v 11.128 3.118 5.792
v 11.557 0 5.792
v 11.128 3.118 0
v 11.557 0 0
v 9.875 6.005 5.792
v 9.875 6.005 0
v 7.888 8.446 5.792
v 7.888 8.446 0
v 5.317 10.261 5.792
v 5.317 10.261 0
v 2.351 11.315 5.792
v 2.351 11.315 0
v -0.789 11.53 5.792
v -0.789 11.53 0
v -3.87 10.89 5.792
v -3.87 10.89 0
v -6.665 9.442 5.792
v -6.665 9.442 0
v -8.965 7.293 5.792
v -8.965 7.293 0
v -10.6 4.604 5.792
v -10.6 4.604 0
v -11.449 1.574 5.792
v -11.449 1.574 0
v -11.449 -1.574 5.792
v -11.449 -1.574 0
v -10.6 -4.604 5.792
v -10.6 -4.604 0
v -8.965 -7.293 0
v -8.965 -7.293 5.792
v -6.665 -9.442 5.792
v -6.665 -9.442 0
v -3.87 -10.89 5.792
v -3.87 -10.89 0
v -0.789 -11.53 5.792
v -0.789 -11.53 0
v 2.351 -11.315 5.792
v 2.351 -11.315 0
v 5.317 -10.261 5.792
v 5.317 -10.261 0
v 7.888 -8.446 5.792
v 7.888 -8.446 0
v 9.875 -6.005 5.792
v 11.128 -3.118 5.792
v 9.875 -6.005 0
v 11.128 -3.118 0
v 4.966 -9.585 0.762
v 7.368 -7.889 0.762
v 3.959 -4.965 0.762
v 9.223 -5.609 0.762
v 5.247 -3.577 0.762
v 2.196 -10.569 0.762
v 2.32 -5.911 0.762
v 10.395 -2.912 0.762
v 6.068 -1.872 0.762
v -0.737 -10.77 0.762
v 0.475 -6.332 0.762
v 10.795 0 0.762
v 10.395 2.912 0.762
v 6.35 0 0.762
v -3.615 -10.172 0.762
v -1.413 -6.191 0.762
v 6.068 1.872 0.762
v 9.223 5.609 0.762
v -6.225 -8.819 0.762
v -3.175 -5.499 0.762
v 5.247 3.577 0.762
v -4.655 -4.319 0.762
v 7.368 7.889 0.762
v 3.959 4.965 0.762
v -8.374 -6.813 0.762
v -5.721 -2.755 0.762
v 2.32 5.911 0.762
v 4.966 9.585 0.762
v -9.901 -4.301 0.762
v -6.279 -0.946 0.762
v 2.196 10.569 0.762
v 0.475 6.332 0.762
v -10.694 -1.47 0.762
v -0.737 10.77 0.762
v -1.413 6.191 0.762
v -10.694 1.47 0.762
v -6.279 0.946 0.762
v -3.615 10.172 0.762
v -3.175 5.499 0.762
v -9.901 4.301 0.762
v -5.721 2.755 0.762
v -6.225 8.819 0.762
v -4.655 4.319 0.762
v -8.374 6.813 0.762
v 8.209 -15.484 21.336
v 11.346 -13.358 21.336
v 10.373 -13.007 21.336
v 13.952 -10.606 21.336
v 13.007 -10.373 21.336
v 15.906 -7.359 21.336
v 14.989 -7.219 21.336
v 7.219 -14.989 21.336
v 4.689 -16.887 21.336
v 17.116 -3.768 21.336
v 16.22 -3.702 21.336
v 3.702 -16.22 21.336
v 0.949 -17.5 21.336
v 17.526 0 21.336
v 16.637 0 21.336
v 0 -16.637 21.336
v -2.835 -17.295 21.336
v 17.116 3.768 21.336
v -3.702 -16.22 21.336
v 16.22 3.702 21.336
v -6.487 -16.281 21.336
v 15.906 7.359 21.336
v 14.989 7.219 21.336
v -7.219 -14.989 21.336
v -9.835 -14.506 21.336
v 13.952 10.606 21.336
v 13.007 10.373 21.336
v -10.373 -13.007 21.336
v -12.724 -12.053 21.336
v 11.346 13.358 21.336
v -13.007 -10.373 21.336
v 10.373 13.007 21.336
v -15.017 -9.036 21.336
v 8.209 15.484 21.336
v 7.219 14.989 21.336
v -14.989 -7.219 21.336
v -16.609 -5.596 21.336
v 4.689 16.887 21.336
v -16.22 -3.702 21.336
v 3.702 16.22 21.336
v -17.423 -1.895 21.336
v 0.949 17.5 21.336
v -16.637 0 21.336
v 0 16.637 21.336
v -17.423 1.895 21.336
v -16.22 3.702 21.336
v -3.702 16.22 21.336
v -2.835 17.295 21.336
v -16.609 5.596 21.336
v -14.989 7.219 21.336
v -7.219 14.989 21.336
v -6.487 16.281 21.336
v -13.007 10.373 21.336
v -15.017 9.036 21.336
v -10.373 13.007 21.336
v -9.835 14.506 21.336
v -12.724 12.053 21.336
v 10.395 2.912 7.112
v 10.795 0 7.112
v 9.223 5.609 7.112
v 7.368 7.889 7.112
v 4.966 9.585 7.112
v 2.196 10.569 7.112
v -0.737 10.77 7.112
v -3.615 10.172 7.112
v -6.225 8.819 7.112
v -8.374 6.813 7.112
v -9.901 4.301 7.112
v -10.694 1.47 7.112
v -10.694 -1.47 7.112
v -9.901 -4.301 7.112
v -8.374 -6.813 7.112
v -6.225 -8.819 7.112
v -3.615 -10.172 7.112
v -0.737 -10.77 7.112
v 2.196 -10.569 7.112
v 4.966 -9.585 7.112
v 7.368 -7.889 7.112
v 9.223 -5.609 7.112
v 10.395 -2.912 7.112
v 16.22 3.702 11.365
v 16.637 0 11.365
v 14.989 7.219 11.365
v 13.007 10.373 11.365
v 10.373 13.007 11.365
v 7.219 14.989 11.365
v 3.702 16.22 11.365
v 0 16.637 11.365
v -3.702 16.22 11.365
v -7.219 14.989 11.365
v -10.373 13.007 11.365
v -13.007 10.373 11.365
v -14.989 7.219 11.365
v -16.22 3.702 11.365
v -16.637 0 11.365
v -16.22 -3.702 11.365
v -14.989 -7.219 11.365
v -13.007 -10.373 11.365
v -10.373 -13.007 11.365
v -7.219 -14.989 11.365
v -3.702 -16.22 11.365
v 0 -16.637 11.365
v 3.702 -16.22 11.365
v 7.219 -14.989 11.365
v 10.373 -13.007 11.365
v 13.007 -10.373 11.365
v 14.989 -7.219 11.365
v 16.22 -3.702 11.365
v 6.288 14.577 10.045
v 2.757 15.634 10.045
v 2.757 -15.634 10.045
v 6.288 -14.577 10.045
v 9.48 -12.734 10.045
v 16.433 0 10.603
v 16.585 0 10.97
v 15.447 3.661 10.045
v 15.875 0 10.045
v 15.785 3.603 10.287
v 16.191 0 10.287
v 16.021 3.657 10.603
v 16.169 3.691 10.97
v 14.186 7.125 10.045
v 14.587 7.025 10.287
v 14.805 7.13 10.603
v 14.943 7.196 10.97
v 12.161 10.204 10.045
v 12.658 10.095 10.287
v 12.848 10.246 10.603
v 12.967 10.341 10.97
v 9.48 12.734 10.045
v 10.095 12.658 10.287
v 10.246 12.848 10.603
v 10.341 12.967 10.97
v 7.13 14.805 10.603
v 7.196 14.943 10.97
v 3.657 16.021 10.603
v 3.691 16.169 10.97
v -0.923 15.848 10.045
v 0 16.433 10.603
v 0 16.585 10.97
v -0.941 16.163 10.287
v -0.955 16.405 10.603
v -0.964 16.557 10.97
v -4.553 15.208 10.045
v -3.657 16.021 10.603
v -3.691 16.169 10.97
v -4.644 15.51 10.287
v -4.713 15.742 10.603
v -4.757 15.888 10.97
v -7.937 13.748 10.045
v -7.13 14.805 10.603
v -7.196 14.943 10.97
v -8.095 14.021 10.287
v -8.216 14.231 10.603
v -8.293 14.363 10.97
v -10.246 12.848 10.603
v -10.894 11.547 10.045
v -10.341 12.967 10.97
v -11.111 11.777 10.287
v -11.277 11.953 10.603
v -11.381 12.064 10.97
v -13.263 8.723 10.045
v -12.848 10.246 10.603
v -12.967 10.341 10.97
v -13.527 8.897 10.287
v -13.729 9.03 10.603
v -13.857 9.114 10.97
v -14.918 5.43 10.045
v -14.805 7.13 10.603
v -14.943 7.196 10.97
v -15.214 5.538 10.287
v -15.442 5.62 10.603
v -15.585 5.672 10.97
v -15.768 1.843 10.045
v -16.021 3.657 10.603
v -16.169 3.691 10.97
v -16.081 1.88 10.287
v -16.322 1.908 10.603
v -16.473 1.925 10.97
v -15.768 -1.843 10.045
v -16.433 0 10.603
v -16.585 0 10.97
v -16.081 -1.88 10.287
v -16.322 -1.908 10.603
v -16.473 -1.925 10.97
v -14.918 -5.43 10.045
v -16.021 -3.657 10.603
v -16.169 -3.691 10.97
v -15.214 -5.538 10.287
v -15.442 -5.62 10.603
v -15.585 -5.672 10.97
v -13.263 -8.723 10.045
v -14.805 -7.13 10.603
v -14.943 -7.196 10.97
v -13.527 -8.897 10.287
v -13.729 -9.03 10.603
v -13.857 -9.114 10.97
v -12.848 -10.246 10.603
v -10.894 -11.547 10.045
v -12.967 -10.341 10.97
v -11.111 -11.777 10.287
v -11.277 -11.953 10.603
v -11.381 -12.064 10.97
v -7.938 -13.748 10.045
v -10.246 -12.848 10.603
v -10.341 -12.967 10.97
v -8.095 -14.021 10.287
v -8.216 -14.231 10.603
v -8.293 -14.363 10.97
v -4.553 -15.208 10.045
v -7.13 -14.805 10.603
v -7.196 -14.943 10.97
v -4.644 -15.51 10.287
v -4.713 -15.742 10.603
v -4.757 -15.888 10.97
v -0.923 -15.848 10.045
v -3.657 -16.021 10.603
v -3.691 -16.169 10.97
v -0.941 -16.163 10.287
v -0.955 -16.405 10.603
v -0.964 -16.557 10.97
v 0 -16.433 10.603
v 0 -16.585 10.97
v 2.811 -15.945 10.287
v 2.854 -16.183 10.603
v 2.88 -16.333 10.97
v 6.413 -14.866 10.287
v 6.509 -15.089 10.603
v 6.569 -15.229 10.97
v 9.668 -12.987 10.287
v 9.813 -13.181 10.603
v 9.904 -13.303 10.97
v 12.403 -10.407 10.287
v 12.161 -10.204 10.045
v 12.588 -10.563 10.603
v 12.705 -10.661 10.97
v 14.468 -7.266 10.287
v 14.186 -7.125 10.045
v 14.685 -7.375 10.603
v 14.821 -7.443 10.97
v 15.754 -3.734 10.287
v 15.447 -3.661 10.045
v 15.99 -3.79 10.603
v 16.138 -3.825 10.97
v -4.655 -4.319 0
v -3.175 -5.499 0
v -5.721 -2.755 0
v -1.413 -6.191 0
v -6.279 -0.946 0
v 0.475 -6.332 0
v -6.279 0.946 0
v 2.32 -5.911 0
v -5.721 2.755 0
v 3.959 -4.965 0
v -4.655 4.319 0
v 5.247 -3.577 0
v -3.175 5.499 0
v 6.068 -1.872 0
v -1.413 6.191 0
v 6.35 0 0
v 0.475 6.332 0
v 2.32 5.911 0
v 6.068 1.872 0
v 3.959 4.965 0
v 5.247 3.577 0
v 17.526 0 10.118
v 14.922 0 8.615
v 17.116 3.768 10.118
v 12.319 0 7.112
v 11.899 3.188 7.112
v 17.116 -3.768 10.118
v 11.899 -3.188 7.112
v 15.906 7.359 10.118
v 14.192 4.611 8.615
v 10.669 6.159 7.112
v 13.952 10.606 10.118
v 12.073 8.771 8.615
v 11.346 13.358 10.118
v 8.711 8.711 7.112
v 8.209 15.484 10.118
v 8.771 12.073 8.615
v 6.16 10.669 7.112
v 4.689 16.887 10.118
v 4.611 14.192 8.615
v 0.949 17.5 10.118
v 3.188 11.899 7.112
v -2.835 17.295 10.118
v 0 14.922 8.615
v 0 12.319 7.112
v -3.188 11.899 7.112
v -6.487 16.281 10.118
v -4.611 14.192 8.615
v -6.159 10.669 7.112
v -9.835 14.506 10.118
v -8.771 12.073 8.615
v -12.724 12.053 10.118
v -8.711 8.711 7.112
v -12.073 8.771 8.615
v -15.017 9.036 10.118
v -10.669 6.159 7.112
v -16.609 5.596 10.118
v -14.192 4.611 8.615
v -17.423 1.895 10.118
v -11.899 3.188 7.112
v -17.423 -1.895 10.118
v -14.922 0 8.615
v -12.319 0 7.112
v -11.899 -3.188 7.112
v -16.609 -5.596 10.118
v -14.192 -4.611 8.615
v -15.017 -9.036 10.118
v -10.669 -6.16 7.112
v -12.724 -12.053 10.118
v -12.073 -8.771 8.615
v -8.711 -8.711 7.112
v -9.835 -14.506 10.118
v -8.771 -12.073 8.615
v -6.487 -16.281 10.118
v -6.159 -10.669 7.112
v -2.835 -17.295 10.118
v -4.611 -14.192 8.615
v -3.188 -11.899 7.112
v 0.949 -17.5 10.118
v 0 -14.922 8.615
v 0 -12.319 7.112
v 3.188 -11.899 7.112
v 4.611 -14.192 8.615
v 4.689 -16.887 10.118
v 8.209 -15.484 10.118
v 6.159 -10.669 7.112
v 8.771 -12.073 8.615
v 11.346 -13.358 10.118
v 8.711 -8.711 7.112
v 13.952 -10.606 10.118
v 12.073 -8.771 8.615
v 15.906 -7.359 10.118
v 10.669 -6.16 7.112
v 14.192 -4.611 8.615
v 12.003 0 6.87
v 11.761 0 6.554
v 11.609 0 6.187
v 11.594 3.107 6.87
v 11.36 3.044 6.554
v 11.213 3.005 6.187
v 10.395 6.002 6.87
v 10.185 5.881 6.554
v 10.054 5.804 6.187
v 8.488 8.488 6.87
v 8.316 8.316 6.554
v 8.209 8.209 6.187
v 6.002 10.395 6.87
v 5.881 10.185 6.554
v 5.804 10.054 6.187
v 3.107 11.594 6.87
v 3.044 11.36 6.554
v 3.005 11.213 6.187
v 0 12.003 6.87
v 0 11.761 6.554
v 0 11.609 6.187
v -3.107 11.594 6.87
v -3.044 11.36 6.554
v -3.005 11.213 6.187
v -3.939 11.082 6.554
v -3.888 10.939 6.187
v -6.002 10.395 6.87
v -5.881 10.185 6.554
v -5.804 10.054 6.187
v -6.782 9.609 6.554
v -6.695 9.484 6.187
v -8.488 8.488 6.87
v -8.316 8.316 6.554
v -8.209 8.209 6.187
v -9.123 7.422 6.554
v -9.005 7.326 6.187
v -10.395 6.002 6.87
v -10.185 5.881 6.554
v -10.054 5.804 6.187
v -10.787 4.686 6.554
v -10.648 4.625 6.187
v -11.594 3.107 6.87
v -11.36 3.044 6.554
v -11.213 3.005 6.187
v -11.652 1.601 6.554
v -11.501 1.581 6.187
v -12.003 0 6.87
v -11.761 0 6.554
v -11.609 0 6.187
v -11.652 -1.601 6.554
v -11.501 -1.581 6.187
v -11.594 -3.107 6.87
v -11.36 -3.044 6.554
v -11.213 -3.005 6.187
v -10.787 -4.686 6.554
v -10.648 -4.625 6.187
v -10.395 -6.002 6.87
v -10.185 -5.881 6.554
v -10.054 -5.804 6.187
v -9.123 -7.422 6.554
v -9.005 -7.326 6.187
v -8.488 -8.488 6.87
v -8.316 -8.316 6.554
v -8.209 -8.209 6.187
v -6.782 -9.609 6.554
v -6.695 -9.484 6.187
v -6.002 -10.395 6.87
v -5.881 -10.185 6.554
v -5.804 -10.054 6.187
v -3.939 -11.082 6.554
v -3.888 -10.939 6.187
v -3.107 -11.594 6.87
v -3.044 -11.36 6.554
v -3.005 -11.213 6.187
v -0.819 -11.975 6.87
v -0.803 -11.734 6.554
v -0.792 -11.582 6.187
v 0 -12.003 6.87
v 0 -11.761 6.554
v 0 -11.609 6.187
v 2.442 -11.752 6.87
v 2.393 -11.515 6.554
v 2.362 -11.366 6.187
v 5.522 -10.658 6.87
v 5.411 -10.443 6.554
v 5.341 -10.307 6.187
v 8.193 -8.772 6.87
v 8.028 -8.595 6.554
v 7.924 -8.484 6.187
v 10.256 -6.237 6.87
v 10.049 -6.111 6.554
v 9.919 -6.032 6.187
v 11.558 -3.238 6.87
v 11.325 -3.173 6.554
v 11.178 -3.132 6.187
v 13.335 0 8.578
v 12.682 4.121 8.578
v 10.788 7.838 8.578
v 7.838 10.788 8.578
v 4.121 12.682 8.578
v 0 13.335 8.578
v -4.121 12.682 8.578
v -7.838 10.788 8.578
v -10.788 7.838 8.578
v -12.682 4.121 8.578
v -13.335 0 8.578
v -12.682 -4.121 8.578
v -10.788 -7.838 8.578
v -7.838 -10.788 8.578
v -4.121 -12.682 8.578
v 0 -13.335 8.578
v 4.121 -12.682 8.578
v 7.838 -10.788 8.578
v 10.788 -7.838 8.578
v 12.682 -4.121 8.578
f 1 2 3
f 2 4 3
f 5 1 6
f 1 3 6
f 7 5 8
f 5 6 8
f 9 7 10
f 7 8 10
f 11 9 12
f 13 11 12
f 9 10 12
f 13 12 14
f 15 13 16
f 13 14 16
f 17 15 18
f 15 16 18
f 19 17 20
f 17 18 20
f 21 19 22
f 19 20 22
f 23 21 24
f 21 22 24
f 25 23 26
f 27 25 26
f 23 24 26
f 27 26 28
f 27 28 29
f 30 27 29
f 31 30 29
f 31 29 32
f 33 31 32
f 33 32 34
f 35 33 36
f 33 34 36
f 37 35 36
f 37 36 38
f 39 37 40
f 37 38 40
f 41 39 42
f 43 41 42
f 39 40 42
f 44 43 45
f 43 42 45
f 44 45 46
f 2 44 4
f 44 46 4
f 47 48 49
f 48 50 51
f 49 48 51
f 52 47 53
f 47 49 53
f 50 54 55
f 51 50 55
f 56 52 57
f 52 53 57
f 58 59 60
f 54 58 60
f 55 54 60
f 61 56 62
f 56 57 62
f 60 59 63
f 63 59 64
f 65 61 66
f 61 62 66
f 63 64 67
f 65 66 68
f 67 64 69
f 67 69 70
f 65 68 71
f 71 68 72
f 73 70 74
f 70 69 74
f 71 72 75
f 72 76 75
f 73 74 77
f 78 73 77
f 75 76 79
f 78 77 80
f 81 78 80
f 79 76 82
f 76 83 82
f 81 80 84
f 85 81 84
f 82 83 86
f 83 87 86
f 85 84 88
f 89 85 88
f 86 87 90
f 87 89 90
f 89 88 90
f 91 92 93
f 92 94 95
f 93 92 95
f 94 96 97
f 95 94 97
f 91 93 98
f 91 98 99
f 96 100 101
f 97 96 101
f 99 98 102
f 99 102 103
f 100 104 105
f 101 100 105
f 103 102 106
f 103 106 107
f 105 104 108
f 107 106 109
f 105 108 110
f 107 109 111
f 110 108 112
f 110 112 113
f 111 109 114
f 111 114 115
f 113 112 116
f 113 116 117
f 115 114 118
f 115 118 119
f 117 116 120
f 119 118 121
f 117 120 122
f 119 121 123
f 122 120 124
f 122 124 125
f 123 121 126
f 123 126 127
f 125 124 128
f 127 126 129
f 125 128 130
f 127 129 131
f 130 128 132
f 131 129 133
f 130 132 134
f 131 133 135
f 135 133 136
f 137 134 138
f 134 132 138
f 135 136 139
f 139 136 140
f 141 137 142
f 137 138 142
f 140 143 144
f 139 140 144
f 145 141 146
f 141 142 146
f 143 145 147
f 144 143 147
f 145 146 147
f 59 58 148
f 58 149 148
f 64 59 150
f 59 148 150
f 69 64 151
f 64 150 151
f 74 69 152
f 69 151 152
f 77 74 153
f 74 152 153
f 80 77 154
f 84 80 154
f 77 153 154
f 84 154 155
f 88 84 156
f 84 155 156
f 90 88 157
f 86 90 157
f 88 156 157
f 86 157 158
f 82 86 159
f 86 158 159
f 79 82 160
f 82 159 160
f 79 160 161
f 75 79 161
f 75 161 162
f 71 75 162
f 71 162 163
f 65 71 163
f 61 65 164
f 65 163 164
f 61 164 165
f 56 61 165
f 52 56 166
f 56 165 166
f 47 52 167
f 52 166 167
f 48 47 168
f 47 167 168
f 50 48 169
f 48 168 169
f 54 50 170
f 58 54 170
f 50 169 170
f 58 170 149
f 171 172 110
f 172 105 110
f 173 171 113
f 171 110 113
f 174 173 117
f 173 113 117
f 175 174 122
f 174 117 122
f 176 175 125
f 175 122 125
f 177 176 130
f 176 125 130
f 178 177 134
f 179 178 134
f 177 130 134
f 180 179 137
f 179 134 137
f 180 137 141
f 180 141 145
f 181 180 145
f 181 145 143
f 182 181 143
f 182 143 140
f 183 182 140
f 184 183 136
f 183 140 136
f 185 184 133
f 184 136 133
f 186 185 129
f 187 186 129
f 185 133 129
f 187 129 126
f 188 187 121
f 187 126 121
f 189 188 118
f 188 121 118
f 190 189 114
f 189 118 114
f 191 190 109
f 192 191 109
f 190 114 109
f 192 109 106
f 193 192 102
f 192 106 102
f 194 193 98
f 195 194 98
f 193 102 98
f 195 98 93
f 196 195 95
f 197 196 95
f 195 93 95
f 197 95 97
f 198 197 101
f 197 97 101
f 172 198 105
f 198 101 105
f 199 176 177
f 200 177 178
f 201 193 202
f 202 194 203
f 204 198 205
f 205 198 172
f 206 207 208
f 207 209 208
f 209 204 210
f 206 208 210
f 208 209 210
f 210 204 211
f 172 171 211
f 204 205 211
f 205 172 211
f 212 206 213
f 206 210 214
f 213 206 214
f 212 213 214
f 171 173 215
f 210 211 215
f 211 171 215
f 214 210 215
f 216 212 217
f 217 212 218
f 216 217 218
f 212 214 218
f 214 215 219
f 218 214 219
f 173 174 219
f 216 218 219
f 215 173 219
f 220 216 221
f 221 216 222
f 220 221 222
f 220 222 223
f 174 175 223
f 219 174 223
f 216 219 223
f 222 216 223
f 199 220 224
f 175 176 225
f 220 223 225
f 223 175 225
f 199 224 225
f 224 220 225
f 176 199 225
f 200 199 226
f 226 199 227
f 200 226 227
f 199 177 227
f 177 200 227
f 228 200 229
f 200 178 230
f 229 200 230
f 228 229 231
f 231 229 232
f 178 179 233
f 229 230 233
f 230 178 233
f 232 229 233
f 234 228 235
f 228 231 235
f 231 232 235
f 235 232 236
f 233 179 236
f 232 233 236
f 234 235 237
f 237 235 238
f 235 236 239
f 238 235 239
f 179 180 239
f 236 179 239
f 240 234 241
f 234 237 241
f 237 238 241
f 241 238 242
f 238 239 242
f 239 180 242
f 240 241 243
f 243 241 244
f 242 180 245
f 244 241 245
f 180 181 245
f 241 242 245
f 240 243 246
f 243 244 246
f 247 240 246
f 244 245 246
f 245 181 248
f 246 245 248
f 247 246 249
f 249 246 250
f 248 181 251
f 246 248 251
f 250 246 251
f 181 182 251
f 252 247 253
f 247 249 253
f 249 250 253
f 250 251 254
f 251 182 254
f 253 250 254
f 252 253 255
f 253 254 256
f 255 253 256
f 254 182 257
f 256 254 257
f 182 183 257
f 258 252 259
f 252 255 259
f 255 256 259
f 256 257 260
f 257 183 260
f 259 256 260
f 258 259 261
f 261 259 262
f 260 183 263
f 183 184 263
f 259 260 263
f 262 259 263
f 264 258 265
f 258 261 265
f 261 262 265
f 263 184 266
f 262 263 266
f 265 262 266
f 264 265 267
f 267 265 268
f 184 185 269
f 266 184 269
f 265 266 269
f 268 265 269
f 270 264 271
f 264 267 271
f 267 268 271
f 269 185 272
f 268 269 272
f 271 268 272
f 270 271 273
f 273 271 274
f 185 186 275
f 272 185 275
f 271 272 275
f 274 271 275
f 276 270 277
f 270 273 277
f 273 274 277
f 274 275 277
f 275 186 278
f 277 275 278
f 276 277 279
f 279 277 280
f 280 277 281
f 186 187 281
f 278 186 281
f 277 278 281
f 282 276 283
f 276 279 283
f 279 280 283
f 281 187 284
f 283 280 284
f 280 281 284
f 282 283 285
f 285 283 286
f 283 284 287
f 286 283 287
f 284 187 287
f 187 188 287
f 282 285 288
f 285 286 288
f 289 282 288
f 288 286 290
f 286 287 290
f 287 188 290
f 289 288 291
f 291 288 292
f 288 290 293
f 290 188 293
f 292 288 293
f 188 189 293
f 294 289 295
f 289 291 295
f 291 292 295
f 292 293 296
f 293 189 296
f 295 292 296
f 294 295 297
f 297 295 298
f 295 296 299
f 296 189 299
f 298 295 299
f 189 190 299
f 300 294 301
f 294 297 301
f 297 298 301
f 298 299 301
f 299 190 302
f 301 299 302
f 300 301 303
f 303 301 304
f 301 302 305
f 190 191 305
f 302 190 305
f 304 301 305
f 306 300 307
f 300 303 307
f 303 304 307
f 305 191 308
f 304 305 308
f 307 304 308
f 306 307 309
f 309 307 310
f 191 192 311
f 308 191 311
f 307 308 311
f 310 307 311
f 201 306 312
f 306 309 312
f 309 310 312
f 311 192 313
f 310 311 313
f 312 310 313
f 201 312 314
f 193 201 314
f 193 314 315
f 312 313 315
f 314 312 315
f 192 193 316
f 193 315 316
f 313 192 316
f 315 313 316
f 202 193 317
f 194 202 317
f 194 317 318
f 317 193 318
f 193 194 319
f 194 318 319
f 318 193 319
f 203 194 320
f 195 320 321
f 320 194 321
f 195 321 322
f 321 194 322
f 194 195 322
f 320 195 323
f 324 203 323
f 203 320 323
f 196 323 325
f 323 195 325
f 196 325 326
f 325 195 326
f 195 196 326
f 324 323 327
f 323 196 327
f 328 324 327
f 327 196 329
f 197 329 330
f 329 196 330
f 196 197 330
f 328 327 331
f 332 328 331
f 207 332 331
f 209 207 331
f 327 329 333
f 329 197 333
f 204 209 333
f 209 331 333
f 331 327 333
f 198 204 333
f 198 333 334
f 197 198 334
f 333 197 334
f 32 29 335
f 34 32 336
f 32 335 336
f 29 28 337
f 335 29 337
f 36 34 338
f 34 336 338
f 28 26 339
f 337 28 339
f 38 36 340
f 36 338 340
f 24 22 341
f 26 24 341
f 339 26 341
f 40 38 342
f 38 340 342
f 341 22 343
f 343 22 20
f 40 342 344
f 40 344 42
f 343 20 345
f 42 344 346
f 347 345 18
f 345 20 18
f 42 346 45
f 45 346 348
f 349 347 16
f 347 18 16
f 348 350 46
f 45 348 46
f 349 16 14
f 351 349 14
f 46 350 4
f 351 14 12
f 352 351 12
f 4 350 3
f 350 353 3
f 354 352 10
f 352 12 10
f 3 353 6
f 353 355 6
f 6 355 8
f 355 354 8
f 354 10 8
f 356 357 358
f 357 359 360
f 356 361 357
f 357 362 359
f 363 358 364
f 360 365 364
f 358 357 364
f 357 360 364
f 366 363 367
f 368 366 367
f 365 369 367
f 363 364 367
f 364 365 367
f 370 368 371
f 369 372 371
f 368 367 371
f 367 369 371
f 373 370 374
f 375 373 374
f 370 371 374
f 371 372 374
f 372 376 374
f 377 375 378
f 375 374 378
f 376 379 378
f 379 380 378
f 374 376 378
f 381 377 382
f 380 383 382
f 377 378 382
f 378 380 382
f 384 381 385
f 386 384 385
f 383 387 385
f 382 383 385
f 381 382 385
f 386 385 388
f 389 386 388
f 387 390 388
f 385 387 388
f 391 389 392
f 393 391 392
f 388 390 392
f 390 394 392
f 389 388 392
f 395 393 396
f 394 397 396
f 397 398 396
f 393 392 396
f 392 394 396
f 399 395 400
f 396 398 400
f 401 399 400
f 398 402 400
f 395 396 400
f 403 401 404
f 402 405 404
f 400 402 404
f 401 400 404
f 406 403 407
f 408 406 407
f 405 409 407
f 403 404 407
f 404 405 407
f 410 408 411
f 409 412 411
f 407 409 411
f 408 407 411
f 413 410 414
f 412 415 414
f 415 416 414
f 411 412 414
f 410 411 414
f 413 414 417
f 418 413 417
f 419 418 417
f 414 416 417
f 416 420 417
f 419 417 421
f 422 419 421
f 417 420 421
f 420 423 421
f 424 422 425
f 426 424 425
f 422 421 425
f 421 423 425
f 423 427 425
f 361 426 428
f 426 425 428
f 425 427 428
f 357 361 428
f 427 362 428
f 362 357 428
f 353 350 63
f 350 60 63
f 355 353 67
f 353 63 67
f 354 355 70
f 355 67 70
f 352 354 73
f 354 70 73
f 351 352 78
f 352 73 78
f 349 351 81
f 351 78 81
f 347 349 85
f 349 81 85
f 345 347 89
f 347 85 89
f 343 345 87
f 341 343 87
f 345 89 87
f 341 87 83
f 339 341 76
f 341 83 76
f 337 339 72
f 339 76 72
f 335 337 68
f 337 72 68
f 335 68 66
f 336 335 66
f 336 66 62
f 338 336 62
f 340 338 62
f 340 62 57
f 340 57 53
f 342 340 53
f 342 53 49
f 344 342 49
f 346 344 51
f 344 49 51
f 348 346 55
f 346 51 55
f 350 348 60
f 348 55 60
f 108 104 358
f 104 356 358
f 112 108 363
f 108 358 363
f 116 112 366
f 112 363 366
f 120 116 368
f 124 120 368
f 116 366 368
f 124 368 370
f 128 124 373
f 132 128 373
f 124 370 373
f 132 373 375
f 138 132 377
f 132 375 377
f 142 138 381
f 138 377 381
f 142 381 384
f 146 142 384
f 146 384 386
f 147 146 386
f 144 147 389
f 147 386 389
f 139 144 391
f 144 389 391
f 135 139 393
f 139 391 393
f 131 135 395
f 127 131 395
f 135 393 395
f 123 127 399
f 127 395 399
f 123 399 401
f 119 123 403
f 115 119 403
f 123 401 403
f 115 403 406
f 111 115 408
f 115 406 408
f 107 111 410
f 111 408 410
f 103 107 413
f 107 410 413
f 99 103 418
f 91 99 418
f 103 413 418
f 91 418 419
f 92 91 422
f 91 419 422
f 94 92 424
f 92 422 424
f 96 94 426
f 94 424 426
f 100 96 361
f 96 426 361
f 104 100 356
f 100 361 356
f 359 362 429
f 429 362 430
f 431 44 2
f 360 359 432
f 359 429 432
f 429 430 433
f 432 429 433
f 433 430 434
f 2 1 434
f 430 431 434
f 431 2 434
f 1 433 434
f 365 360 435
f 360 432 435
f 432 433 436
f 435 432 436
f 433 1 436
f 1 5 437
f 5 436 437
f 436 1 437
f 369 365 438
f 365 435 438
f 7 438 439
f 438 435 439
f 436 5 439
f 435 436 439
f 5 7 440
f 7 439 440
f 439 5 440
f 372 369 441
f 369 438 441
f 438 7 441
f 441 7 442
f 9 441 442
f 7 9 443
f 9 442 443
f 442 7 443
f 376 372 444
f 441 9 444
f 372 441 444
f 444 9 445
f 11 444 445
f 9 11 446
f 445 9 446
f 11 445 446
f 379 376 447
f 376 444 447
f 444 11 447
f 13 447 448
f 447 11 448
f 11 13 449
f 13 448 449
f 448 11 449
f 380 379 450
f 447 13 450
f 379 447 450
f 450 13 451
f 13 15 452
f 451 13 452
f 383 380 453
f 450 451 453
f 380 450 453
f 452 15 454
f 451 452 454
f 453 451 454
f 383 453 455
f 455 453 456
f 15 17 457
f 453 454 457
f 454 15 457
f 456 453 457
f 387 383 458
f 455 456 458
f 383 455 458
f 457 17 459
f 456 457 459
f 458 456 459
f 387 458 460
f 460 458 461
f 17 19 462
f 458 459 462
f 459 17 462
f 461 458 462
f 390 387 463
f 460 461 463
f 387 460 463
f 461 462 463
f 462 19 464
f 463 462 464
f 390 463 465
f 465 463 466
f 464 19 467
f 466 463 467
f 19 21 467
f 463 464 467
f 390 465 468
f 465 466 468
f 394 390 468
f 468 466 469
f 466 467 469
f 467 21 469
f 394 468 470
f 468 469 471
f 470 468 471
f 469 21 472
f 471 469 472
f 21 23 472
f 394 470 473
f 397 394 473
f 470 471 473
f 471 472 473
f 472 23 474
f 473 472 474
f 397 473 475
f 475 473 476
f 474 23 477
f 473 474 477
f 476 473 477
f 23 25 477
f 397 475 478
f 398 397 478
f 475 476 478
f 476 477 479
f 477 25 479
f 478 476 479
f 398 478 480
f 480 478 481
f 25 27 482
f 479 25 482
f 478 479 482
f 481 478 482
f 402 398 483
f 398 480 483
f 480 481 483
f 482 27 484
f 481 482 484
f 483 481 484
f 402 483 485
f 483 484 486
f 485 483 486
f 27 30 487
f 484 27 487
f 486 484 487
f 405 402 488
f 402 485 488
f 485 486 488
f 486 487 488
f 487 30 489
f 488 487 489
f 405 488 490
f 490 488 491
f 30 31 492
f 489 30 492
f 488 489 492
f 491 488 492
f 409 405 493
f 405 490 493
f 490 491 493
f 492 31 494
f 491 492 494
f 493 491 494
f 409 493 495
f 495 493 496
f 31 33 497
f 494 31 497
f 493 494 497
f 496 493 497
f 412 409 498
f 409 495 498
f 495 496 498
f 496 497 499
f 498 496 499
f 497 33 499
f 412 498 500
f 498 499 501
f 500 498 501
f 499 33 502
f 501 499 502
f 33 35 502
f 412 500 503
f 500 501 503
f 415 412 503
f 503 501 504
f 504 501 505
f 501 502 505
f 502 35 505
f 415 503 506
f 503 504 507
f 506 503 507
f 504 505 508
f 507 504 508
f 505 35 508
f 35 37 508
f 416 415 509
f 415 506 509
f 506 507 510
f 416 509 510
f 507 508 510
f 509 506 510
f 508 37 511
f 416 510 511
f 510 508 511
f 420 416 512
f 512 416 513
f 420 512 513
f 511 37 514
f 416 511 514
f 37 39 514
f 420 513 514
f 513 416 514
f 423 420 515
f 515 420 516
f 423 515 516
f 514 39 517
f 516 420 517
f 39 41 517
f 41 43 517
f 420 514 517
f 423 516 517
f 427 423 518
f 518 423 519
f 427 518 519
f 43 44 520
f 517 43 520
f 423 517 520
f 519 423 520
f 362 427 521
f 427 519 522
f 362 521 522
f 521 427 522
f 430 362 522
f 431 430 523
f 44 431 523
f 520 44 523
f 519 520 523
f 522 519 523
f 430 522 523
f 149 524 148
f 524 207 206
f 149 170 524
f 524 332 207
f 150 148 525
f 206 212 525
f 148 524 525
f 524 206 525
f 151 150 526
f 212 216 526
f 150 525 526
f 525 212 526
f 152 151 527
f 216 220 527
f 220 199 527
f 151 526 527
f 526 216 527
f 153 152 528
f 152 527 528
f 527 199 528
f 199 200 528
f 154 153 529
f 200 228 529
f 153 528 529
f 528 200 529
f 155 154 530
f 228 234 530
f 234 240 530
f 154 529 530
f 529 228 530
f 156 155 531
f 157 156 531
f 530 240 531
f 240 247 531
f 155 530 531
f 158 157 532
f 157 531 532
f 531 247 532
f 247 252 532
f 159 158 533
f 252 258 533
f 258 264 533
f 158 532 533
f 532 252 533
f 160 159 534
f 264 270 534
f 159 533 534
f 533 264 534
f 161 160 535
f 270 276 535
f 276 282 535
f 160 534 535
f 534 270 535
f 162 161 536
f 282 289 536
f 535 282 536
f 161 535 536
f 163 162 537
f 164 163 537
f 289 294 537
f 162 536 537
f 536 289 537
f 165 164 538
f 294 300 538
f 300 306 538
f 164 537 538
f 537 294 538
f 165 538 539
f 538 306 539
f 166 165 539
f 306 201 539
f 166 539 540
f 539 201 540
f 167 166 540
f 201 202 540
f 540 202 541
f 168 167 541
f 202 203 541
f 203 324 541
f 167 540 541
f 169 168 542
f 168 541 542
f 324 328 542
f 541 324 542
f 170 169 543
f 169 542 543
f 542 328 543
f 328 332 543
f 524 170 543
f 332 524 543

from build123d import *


with BuildPart() as part:
    # Sketch1 → Revolve1 (revolve)
    with BuildSketch(Plane(origin=(0, 0, 0), x_dir=(1, 0, 0), z_dir=(0, 1, 0))):
        with BuildLine():
            Line((6.35, -0.762), (10.795, -0.762))
            Line((10.795, -0.762), (10.795, -7.112))
            Line((10.795, -7.112), (15.875, -10.044939367))
            ThreePointArc((15.875, -10.044939367), (16.432822715, -10.602762083), (16.637, -11.364762083))
            Line((16.637, -11.364762083), (16.637, -21.336))
            Line((16.637, -21.336), (17.526, -21.336))
            Line((17.526, -21.336), (17.526, -10.118262852))
            Line((17.526, -10.118262852), (12.319, -7.112))
            ThreePointArc((12.319, -7.112), (11.761177285, -6.554177285), (11.557, -5.792177285))
            Line((11.557, -5.792177285), (11.557, 0))
            Line((11.557, 0), (6.35, 0))
            Line((6.35, 0), (6.35, -0.762))
        make_face()
    revolve(axis=Axis((0, 0, 0), (0, 0, 1)))


solid = part.part
